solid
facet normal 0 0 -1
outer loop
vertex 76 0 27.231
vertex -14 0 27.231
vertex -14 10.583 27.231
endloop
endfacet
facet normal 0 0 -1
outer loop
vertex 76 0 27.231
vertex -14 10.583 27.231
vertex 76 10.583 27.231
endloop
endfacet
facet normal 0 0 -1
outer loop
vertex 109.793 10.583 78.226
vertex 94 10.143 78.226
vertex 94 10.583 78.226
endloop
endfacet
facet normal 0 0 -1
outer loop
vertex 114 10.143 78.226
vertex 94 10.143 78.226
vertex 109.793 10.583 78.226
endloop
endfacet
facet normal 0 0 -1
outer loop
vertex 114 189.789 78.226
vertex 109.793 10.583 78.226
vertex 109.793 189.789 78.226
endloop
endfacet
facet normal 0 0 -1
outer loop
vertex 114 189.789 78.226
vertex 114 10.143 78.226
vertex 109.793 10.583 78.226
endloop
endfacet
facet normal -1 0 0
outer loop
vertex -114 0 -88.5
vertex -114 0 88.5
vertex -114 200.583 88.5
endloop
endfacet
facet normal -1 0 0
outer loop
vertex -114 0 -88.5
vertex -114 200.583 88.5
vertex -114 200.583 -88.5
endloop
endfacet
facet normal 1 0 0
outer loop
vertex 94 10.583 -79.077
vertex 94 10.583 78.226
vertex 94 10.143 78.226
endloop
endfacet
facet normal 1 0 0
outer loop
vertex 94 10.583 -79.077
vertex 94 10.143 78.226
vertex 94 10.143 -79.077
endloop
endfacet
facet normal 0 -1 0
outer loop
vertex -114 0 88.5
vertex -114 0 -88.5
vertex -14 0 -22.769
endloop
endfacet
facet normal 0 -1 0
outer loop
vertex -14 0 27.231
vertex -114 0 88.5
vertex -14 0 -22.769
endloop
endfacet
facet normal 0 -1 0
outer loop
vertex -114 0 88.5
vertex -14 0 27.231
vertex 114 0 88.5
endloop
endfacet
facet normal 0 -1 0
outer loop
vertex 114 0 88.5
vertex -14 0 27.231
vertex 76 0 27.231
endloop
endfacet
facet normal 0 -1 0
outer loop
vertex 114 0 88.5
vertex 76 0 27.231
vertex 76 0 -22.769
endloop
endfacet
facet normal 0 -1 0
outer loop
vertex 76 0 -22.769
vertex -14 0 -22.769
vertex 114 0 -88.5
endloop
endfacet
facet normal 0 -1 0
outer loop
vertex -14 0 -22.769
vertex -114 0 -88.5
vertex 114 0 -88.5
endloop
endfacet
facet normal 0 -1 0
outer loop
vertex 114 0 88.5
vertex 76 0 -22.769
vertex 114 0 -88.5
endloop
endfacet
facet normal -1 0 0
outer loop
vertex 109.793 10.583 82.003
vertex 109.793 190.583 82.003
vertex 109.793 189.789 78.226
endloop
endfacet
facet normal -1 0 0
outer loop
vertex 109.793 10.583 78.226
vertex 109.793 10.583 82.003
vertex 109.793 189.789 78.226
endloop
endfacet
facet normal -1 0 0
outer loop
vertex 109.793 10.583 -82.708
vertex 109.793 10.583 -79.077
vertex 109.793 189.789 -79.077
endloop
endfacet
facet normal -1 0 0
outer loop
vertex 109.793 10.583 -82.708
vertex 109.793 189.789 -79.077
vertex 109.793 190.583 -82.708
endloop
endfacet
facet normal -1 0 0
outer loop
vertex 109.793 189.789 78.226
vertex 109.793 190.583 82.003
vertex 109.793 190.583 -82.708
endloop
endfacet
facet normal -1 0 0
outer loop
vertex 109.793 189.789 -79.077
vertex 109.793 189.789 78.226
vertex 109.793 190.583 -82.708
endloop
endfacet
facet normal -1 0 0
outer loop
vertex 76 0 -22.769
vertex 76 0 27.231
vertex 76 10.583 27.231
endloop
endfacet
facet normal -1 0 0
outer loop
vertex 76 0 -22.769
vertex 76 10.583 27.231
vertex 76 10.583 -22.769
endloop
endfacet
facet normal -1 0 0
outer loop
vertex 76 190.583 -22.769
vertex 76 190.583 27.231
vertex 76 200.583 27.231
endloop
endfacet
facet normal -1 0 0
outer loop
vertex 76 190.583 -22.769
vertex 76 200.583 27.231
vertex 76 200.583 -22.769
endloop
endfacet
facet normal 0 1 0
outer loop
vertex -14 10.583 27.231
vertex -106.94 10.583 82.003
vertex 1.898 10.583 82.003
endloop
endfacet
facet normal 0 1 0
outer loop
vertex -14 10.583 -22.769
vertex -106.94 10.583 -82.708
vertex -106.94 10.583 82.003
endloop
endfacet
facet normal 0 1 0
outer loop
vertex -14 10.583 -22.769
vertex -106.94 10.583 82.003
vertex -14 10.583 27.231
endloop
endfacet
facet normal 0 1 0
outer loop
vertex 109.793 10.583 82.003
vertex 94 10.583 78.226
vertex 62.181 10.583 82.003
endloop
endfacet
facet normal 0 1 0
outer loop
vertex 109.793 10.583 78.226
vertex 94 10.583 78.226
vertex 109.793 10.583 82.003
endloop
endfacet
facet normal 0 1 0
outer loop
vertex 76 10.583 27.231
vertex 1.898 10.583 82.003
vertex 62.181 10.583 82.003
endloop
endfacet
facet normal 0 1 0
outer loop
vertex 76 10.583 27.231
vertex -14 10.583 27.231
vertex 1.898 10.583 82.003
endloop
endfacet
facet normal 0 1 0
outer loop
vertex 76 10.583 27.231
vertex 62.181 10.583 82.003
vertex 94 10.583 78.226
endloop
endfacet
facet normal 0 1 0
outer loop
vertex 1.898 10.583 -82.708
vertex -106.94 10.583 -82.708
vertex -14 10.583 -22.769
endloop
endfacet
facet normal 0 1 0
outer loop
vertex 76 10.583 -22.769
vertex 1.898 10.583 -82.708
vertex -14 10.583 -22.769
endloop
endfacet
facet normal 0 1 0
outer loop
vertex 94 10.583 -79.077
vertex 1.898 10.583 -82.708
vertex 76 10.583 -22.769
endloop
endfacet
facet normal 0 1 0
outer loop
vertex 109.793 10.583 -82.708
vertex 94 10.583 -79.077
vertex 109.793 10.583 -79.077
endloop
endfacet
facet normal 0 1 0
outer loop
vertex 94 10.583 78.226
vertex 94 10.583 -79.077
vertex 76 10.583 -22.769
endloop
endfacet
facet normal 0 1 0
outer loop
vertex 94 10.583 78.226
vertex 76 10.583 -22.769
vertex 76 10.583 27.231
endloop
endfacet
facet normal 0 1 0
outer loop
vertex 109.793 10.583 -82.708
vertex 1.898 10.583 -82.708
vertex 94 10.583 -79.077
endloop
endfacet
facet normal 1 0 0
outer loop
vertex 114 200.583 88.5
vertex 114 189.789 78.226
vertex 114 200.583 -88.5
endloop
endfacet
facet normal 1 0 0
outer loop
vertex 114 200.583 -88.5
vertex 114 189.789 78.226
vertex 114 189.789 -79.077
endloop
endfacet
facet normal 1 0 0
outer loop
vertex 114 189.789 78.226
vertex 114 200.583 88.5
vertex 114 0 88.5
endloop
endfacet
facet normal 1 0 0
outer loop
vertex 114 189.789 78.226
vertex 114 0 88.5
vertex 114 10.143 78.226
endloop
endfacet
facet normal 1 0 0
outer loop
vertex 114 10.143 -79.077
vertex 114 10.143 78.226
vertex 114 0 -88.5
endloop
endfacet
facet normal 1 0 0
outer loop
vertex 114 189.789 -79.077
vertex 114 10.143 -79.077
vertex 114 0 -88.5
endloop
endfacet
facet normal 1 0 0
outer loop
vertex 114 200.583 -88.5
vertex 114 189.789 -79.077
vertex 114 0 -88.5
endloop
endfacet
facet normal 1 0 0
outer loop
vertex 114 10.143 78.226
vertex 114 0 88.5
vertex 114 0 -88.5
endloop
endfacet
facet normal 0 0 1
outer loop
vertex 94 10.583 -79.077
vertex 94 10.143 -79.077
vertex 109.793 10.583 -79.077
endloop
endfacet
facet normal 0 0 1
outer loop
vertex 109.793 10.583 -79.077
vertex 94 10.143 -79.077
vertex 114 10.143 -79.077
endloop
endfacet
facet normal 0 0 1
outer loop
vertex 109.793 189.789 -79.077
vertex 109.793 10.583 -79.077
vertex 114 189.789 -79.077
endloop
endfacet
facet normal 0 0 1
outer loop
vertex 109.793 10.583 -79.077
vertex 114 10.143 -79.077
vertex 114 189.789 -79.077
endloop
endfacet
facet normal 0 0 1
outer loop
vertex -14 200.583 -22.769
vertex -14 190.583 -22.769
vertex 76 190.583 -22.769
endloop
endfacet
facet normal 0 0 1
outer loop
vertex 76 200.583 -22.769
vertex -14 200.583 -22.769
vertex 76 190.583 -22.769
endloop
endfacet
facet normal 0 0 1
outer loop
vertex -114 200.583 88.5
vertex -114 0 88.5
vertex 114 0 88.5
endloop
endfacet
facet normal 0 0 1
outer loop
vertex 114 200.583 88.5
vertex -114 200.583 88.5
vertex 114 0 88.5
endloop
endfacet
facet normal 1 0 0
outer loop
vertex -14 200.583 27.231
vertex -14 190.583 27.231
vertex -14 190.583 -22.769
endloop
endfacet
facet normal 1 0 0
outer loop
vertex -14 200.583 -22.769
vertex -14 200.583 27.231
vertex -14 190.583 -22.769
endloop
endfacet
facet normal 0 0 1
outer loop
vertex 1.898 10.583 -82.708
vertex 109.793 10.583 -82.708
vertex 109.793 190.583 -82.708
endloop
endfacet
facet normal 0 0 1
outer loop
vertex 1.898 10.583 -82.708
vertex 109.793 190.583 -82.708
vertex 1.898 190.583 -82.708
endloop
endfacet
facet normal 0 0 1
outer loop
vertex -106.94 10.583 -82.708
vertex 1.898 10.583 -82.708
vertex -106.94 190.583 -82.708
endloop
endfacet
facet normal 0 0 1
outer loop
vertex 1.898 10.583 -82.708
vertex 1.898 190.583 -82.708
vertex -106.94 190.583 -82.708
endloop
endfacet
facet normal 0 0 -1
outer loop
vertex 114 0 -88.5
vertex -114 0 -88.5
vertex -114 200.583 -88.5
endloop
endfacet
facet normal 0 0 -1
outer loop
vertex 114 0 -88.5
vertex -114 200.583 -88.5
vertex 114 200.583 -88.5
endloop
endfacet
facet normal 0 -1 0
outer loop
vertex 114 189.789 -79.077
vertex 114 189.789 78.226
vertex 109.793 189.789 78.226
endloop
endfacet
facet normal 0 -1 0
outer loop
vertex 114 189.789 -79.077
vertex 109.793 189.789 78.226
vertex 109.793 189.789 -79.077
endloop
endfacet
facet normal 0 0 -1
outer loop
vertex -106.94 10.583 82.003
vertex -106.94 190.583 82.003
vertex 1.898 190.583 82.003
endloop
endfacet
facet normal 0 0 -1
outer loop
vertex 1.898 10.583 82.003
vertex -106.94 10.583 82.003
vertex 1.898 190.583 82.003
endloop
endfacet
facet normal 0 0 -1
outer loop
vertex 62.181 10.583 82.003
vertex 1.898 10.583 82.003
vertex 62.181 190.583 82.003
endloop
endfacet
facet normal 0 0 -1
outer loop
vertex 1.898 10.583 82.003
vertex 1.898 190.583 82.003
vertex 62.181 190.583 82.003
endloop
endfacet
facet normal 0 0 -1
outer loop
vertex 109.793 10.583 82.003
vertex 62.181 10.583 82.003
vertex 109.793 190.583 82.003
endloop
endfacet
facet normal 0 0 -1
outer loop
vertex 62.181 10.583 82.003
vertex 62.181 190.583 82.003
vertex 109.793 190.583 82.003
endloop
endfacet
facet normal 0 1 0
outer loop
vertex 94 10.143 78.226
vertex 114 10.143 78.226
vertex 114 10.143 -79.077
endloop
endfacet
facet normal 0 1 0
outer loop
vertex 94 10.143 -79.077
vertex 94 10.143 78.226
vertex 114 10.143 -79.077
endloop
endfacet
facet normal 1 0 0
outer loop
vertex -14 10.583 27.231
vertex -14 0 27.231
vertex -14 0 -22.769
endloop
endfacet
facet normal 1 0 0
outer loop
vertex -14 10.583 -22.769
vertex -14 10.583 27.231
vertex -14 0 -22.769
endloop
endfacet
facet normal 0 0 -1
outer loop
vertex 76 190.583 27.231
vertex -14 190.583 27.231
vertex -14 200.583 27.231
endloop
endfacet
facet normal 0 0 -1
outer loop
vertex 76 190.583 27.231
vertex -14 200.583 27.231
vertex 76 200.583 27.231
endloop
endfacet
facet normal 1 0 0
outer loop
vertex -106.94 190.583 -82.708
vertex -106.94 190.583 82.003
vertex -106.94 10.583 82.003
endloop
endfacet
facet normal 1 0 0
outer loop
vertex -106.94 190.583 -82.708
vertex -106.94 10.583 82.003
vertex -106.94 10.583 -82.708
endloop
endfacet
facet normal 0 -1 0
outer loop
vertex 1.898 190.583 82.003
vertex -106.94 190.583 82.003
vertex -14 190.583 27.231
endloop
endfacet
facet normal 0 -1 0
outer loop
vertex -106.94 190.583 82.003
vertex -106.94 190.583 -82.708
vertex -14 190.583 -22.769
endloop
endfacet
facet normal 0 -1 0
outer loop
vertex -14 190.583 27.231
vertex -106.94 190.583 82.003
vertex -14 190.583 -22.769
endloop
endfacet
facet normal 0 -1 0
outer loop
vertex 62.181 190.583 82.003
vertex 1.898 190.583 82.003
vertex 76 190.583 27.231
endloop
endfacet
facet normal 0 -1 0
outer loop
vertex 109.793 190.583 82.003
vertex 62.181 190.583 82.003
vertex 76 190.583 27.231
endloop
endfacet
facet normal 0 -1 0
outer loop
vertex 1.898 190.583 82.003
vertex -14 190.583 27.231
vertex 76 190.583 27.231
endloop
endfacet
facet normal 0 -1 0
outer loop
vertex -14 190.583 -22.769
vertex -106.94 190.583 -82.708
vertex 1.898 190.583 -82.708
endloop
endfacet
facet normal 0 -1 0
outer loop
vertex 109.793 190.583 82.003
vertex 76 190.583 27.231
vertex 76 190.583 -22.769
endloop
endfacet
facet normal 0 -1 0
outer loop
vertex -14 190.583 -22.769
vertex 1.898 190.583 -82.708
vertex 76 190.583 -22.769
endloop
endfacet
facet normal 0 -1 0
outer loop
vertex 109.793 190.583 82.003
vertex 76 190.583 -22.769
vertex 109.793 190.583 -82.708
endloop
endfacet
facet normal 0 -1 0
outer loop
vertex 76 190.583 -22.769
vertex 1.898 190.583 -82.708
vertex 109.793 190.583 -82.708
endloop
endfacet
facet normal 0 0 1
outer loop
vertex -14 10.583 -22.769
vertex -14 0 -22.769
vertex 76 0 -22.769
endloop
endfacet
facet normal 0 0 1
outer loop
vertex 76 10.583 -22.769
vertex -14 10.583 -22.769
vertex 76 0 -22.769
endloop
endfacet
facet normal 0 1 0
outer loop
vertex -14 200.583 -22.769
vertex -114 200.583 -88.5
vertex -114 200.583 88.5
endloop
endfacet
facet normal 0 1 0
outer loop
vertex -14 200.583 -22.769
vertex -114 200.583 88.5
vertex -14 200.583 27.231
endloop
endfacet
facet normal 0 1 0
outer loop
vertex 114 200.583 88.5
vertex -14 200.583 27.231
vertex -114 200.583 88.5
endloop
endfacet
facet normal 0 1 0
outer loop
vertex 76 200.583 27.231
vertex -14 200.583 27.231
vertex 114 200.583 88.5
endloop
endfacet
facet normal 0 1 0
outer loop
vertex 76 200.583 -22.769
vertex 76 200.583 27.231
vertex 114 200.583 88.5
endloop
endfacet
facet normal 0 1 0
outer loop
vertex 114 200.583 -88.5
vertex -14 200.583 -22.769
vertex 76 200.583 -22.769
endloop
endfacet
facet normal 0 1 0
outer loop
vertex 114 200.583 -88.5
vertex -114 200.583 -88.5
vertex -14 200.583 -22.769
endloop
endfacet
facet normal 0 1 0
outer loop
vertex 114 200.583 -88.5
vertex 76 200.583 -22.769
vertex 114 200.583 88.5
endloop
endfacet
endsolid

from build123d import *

# Parameters (mm, degrees)
SKETCH1_W           = 228
SKETCH1_H           = 177
SKETCH1_W_2         = 90
SKETCH1_H_2         = 50
BOSS_EXTRUDE2_DEPTH = 200.582631371
CUT_EXTRUDE1_START  = -10
SKETCH2_W           = 108.838399528
SKETCH2_H           = 164.710968607
SKETCH2_W_2         = 60.282653626
SKETCH2_H_2         = 61.539971991
CUT_EXTRUDE1_DEPTH  = 180
SKETCH5_W           = 157.303446562
SKETCH5_H           = 179.645970641
CUT_EXTRUDE2_DEPTH  = 20


with BuildPart() as part:
    # Sketch1 → Boss-Extrude2 (new body)
    with BuildSketch(Plane(origin=(0, 0, 0), x_dir=(1, 0, 0), z_dir=(0, 1, 0))):
        Rectangle(SKETCH1_W, SKETCH1_H)
        with Locations((31, -2.231282948)):
            Rectangle(SKETCH1_W_2, SKETCH1_H_2, mode=Mode.SUBTRACT)
    extrude(amount=BOSS_EXTRUDE2_DEPTH)

    # Sketch2 → Cut-Extrude1 (cut)
    with BuildSketch(Plane(origin=(0, 200.582631371, 0), x_dir=(1, 0, 0), z_dir=(0, 1, 0)).offset(CUT_EXTRUDE1_START)):
        with Locations((-52.521027136, 0.352939873)):
            Rectangle(SKETCH2_W, SKETCH2_H)
        Polygon((109.79292582, 82.708424176), (1.898172628, 82.708424176), (1.898172628, 8.029391403), (62.180826254, 8.029391403), (109.79292582, 8.029391403), align=None)
        with Locations((32.039499441, -51.232558436)):
            Rectangle(SKETCH2_W_2, SKETCH2_H_2)
        Polygon((109.79292582, 8.029391403), (62.180826254, 8.029391403), (62.180826254, -20.46257244), (62.180826254, -82.002544431), (109.79292582, -82.002544431), align=None)
    extrude(amount=-CUT_EXTRUDE1_DEPTH, mode=Mode.SUBTRACT)

    # Sketch5 → Cut-Extrude2 (cut)
    with BuildSketch(Plane(origin=(114, 0, 0), x_dir=(0, 0, -1), z_dir=(1, 0, 0))):
        with Locations((0.425718885, 99.965893577)):
            Rectangle(SKETCH5_W, SKETCH5_H)
    extrude(amount=-CUT_EXTRUDE2_DEPTH, mode=Mode.SUBTRACT)


solid = part.part
